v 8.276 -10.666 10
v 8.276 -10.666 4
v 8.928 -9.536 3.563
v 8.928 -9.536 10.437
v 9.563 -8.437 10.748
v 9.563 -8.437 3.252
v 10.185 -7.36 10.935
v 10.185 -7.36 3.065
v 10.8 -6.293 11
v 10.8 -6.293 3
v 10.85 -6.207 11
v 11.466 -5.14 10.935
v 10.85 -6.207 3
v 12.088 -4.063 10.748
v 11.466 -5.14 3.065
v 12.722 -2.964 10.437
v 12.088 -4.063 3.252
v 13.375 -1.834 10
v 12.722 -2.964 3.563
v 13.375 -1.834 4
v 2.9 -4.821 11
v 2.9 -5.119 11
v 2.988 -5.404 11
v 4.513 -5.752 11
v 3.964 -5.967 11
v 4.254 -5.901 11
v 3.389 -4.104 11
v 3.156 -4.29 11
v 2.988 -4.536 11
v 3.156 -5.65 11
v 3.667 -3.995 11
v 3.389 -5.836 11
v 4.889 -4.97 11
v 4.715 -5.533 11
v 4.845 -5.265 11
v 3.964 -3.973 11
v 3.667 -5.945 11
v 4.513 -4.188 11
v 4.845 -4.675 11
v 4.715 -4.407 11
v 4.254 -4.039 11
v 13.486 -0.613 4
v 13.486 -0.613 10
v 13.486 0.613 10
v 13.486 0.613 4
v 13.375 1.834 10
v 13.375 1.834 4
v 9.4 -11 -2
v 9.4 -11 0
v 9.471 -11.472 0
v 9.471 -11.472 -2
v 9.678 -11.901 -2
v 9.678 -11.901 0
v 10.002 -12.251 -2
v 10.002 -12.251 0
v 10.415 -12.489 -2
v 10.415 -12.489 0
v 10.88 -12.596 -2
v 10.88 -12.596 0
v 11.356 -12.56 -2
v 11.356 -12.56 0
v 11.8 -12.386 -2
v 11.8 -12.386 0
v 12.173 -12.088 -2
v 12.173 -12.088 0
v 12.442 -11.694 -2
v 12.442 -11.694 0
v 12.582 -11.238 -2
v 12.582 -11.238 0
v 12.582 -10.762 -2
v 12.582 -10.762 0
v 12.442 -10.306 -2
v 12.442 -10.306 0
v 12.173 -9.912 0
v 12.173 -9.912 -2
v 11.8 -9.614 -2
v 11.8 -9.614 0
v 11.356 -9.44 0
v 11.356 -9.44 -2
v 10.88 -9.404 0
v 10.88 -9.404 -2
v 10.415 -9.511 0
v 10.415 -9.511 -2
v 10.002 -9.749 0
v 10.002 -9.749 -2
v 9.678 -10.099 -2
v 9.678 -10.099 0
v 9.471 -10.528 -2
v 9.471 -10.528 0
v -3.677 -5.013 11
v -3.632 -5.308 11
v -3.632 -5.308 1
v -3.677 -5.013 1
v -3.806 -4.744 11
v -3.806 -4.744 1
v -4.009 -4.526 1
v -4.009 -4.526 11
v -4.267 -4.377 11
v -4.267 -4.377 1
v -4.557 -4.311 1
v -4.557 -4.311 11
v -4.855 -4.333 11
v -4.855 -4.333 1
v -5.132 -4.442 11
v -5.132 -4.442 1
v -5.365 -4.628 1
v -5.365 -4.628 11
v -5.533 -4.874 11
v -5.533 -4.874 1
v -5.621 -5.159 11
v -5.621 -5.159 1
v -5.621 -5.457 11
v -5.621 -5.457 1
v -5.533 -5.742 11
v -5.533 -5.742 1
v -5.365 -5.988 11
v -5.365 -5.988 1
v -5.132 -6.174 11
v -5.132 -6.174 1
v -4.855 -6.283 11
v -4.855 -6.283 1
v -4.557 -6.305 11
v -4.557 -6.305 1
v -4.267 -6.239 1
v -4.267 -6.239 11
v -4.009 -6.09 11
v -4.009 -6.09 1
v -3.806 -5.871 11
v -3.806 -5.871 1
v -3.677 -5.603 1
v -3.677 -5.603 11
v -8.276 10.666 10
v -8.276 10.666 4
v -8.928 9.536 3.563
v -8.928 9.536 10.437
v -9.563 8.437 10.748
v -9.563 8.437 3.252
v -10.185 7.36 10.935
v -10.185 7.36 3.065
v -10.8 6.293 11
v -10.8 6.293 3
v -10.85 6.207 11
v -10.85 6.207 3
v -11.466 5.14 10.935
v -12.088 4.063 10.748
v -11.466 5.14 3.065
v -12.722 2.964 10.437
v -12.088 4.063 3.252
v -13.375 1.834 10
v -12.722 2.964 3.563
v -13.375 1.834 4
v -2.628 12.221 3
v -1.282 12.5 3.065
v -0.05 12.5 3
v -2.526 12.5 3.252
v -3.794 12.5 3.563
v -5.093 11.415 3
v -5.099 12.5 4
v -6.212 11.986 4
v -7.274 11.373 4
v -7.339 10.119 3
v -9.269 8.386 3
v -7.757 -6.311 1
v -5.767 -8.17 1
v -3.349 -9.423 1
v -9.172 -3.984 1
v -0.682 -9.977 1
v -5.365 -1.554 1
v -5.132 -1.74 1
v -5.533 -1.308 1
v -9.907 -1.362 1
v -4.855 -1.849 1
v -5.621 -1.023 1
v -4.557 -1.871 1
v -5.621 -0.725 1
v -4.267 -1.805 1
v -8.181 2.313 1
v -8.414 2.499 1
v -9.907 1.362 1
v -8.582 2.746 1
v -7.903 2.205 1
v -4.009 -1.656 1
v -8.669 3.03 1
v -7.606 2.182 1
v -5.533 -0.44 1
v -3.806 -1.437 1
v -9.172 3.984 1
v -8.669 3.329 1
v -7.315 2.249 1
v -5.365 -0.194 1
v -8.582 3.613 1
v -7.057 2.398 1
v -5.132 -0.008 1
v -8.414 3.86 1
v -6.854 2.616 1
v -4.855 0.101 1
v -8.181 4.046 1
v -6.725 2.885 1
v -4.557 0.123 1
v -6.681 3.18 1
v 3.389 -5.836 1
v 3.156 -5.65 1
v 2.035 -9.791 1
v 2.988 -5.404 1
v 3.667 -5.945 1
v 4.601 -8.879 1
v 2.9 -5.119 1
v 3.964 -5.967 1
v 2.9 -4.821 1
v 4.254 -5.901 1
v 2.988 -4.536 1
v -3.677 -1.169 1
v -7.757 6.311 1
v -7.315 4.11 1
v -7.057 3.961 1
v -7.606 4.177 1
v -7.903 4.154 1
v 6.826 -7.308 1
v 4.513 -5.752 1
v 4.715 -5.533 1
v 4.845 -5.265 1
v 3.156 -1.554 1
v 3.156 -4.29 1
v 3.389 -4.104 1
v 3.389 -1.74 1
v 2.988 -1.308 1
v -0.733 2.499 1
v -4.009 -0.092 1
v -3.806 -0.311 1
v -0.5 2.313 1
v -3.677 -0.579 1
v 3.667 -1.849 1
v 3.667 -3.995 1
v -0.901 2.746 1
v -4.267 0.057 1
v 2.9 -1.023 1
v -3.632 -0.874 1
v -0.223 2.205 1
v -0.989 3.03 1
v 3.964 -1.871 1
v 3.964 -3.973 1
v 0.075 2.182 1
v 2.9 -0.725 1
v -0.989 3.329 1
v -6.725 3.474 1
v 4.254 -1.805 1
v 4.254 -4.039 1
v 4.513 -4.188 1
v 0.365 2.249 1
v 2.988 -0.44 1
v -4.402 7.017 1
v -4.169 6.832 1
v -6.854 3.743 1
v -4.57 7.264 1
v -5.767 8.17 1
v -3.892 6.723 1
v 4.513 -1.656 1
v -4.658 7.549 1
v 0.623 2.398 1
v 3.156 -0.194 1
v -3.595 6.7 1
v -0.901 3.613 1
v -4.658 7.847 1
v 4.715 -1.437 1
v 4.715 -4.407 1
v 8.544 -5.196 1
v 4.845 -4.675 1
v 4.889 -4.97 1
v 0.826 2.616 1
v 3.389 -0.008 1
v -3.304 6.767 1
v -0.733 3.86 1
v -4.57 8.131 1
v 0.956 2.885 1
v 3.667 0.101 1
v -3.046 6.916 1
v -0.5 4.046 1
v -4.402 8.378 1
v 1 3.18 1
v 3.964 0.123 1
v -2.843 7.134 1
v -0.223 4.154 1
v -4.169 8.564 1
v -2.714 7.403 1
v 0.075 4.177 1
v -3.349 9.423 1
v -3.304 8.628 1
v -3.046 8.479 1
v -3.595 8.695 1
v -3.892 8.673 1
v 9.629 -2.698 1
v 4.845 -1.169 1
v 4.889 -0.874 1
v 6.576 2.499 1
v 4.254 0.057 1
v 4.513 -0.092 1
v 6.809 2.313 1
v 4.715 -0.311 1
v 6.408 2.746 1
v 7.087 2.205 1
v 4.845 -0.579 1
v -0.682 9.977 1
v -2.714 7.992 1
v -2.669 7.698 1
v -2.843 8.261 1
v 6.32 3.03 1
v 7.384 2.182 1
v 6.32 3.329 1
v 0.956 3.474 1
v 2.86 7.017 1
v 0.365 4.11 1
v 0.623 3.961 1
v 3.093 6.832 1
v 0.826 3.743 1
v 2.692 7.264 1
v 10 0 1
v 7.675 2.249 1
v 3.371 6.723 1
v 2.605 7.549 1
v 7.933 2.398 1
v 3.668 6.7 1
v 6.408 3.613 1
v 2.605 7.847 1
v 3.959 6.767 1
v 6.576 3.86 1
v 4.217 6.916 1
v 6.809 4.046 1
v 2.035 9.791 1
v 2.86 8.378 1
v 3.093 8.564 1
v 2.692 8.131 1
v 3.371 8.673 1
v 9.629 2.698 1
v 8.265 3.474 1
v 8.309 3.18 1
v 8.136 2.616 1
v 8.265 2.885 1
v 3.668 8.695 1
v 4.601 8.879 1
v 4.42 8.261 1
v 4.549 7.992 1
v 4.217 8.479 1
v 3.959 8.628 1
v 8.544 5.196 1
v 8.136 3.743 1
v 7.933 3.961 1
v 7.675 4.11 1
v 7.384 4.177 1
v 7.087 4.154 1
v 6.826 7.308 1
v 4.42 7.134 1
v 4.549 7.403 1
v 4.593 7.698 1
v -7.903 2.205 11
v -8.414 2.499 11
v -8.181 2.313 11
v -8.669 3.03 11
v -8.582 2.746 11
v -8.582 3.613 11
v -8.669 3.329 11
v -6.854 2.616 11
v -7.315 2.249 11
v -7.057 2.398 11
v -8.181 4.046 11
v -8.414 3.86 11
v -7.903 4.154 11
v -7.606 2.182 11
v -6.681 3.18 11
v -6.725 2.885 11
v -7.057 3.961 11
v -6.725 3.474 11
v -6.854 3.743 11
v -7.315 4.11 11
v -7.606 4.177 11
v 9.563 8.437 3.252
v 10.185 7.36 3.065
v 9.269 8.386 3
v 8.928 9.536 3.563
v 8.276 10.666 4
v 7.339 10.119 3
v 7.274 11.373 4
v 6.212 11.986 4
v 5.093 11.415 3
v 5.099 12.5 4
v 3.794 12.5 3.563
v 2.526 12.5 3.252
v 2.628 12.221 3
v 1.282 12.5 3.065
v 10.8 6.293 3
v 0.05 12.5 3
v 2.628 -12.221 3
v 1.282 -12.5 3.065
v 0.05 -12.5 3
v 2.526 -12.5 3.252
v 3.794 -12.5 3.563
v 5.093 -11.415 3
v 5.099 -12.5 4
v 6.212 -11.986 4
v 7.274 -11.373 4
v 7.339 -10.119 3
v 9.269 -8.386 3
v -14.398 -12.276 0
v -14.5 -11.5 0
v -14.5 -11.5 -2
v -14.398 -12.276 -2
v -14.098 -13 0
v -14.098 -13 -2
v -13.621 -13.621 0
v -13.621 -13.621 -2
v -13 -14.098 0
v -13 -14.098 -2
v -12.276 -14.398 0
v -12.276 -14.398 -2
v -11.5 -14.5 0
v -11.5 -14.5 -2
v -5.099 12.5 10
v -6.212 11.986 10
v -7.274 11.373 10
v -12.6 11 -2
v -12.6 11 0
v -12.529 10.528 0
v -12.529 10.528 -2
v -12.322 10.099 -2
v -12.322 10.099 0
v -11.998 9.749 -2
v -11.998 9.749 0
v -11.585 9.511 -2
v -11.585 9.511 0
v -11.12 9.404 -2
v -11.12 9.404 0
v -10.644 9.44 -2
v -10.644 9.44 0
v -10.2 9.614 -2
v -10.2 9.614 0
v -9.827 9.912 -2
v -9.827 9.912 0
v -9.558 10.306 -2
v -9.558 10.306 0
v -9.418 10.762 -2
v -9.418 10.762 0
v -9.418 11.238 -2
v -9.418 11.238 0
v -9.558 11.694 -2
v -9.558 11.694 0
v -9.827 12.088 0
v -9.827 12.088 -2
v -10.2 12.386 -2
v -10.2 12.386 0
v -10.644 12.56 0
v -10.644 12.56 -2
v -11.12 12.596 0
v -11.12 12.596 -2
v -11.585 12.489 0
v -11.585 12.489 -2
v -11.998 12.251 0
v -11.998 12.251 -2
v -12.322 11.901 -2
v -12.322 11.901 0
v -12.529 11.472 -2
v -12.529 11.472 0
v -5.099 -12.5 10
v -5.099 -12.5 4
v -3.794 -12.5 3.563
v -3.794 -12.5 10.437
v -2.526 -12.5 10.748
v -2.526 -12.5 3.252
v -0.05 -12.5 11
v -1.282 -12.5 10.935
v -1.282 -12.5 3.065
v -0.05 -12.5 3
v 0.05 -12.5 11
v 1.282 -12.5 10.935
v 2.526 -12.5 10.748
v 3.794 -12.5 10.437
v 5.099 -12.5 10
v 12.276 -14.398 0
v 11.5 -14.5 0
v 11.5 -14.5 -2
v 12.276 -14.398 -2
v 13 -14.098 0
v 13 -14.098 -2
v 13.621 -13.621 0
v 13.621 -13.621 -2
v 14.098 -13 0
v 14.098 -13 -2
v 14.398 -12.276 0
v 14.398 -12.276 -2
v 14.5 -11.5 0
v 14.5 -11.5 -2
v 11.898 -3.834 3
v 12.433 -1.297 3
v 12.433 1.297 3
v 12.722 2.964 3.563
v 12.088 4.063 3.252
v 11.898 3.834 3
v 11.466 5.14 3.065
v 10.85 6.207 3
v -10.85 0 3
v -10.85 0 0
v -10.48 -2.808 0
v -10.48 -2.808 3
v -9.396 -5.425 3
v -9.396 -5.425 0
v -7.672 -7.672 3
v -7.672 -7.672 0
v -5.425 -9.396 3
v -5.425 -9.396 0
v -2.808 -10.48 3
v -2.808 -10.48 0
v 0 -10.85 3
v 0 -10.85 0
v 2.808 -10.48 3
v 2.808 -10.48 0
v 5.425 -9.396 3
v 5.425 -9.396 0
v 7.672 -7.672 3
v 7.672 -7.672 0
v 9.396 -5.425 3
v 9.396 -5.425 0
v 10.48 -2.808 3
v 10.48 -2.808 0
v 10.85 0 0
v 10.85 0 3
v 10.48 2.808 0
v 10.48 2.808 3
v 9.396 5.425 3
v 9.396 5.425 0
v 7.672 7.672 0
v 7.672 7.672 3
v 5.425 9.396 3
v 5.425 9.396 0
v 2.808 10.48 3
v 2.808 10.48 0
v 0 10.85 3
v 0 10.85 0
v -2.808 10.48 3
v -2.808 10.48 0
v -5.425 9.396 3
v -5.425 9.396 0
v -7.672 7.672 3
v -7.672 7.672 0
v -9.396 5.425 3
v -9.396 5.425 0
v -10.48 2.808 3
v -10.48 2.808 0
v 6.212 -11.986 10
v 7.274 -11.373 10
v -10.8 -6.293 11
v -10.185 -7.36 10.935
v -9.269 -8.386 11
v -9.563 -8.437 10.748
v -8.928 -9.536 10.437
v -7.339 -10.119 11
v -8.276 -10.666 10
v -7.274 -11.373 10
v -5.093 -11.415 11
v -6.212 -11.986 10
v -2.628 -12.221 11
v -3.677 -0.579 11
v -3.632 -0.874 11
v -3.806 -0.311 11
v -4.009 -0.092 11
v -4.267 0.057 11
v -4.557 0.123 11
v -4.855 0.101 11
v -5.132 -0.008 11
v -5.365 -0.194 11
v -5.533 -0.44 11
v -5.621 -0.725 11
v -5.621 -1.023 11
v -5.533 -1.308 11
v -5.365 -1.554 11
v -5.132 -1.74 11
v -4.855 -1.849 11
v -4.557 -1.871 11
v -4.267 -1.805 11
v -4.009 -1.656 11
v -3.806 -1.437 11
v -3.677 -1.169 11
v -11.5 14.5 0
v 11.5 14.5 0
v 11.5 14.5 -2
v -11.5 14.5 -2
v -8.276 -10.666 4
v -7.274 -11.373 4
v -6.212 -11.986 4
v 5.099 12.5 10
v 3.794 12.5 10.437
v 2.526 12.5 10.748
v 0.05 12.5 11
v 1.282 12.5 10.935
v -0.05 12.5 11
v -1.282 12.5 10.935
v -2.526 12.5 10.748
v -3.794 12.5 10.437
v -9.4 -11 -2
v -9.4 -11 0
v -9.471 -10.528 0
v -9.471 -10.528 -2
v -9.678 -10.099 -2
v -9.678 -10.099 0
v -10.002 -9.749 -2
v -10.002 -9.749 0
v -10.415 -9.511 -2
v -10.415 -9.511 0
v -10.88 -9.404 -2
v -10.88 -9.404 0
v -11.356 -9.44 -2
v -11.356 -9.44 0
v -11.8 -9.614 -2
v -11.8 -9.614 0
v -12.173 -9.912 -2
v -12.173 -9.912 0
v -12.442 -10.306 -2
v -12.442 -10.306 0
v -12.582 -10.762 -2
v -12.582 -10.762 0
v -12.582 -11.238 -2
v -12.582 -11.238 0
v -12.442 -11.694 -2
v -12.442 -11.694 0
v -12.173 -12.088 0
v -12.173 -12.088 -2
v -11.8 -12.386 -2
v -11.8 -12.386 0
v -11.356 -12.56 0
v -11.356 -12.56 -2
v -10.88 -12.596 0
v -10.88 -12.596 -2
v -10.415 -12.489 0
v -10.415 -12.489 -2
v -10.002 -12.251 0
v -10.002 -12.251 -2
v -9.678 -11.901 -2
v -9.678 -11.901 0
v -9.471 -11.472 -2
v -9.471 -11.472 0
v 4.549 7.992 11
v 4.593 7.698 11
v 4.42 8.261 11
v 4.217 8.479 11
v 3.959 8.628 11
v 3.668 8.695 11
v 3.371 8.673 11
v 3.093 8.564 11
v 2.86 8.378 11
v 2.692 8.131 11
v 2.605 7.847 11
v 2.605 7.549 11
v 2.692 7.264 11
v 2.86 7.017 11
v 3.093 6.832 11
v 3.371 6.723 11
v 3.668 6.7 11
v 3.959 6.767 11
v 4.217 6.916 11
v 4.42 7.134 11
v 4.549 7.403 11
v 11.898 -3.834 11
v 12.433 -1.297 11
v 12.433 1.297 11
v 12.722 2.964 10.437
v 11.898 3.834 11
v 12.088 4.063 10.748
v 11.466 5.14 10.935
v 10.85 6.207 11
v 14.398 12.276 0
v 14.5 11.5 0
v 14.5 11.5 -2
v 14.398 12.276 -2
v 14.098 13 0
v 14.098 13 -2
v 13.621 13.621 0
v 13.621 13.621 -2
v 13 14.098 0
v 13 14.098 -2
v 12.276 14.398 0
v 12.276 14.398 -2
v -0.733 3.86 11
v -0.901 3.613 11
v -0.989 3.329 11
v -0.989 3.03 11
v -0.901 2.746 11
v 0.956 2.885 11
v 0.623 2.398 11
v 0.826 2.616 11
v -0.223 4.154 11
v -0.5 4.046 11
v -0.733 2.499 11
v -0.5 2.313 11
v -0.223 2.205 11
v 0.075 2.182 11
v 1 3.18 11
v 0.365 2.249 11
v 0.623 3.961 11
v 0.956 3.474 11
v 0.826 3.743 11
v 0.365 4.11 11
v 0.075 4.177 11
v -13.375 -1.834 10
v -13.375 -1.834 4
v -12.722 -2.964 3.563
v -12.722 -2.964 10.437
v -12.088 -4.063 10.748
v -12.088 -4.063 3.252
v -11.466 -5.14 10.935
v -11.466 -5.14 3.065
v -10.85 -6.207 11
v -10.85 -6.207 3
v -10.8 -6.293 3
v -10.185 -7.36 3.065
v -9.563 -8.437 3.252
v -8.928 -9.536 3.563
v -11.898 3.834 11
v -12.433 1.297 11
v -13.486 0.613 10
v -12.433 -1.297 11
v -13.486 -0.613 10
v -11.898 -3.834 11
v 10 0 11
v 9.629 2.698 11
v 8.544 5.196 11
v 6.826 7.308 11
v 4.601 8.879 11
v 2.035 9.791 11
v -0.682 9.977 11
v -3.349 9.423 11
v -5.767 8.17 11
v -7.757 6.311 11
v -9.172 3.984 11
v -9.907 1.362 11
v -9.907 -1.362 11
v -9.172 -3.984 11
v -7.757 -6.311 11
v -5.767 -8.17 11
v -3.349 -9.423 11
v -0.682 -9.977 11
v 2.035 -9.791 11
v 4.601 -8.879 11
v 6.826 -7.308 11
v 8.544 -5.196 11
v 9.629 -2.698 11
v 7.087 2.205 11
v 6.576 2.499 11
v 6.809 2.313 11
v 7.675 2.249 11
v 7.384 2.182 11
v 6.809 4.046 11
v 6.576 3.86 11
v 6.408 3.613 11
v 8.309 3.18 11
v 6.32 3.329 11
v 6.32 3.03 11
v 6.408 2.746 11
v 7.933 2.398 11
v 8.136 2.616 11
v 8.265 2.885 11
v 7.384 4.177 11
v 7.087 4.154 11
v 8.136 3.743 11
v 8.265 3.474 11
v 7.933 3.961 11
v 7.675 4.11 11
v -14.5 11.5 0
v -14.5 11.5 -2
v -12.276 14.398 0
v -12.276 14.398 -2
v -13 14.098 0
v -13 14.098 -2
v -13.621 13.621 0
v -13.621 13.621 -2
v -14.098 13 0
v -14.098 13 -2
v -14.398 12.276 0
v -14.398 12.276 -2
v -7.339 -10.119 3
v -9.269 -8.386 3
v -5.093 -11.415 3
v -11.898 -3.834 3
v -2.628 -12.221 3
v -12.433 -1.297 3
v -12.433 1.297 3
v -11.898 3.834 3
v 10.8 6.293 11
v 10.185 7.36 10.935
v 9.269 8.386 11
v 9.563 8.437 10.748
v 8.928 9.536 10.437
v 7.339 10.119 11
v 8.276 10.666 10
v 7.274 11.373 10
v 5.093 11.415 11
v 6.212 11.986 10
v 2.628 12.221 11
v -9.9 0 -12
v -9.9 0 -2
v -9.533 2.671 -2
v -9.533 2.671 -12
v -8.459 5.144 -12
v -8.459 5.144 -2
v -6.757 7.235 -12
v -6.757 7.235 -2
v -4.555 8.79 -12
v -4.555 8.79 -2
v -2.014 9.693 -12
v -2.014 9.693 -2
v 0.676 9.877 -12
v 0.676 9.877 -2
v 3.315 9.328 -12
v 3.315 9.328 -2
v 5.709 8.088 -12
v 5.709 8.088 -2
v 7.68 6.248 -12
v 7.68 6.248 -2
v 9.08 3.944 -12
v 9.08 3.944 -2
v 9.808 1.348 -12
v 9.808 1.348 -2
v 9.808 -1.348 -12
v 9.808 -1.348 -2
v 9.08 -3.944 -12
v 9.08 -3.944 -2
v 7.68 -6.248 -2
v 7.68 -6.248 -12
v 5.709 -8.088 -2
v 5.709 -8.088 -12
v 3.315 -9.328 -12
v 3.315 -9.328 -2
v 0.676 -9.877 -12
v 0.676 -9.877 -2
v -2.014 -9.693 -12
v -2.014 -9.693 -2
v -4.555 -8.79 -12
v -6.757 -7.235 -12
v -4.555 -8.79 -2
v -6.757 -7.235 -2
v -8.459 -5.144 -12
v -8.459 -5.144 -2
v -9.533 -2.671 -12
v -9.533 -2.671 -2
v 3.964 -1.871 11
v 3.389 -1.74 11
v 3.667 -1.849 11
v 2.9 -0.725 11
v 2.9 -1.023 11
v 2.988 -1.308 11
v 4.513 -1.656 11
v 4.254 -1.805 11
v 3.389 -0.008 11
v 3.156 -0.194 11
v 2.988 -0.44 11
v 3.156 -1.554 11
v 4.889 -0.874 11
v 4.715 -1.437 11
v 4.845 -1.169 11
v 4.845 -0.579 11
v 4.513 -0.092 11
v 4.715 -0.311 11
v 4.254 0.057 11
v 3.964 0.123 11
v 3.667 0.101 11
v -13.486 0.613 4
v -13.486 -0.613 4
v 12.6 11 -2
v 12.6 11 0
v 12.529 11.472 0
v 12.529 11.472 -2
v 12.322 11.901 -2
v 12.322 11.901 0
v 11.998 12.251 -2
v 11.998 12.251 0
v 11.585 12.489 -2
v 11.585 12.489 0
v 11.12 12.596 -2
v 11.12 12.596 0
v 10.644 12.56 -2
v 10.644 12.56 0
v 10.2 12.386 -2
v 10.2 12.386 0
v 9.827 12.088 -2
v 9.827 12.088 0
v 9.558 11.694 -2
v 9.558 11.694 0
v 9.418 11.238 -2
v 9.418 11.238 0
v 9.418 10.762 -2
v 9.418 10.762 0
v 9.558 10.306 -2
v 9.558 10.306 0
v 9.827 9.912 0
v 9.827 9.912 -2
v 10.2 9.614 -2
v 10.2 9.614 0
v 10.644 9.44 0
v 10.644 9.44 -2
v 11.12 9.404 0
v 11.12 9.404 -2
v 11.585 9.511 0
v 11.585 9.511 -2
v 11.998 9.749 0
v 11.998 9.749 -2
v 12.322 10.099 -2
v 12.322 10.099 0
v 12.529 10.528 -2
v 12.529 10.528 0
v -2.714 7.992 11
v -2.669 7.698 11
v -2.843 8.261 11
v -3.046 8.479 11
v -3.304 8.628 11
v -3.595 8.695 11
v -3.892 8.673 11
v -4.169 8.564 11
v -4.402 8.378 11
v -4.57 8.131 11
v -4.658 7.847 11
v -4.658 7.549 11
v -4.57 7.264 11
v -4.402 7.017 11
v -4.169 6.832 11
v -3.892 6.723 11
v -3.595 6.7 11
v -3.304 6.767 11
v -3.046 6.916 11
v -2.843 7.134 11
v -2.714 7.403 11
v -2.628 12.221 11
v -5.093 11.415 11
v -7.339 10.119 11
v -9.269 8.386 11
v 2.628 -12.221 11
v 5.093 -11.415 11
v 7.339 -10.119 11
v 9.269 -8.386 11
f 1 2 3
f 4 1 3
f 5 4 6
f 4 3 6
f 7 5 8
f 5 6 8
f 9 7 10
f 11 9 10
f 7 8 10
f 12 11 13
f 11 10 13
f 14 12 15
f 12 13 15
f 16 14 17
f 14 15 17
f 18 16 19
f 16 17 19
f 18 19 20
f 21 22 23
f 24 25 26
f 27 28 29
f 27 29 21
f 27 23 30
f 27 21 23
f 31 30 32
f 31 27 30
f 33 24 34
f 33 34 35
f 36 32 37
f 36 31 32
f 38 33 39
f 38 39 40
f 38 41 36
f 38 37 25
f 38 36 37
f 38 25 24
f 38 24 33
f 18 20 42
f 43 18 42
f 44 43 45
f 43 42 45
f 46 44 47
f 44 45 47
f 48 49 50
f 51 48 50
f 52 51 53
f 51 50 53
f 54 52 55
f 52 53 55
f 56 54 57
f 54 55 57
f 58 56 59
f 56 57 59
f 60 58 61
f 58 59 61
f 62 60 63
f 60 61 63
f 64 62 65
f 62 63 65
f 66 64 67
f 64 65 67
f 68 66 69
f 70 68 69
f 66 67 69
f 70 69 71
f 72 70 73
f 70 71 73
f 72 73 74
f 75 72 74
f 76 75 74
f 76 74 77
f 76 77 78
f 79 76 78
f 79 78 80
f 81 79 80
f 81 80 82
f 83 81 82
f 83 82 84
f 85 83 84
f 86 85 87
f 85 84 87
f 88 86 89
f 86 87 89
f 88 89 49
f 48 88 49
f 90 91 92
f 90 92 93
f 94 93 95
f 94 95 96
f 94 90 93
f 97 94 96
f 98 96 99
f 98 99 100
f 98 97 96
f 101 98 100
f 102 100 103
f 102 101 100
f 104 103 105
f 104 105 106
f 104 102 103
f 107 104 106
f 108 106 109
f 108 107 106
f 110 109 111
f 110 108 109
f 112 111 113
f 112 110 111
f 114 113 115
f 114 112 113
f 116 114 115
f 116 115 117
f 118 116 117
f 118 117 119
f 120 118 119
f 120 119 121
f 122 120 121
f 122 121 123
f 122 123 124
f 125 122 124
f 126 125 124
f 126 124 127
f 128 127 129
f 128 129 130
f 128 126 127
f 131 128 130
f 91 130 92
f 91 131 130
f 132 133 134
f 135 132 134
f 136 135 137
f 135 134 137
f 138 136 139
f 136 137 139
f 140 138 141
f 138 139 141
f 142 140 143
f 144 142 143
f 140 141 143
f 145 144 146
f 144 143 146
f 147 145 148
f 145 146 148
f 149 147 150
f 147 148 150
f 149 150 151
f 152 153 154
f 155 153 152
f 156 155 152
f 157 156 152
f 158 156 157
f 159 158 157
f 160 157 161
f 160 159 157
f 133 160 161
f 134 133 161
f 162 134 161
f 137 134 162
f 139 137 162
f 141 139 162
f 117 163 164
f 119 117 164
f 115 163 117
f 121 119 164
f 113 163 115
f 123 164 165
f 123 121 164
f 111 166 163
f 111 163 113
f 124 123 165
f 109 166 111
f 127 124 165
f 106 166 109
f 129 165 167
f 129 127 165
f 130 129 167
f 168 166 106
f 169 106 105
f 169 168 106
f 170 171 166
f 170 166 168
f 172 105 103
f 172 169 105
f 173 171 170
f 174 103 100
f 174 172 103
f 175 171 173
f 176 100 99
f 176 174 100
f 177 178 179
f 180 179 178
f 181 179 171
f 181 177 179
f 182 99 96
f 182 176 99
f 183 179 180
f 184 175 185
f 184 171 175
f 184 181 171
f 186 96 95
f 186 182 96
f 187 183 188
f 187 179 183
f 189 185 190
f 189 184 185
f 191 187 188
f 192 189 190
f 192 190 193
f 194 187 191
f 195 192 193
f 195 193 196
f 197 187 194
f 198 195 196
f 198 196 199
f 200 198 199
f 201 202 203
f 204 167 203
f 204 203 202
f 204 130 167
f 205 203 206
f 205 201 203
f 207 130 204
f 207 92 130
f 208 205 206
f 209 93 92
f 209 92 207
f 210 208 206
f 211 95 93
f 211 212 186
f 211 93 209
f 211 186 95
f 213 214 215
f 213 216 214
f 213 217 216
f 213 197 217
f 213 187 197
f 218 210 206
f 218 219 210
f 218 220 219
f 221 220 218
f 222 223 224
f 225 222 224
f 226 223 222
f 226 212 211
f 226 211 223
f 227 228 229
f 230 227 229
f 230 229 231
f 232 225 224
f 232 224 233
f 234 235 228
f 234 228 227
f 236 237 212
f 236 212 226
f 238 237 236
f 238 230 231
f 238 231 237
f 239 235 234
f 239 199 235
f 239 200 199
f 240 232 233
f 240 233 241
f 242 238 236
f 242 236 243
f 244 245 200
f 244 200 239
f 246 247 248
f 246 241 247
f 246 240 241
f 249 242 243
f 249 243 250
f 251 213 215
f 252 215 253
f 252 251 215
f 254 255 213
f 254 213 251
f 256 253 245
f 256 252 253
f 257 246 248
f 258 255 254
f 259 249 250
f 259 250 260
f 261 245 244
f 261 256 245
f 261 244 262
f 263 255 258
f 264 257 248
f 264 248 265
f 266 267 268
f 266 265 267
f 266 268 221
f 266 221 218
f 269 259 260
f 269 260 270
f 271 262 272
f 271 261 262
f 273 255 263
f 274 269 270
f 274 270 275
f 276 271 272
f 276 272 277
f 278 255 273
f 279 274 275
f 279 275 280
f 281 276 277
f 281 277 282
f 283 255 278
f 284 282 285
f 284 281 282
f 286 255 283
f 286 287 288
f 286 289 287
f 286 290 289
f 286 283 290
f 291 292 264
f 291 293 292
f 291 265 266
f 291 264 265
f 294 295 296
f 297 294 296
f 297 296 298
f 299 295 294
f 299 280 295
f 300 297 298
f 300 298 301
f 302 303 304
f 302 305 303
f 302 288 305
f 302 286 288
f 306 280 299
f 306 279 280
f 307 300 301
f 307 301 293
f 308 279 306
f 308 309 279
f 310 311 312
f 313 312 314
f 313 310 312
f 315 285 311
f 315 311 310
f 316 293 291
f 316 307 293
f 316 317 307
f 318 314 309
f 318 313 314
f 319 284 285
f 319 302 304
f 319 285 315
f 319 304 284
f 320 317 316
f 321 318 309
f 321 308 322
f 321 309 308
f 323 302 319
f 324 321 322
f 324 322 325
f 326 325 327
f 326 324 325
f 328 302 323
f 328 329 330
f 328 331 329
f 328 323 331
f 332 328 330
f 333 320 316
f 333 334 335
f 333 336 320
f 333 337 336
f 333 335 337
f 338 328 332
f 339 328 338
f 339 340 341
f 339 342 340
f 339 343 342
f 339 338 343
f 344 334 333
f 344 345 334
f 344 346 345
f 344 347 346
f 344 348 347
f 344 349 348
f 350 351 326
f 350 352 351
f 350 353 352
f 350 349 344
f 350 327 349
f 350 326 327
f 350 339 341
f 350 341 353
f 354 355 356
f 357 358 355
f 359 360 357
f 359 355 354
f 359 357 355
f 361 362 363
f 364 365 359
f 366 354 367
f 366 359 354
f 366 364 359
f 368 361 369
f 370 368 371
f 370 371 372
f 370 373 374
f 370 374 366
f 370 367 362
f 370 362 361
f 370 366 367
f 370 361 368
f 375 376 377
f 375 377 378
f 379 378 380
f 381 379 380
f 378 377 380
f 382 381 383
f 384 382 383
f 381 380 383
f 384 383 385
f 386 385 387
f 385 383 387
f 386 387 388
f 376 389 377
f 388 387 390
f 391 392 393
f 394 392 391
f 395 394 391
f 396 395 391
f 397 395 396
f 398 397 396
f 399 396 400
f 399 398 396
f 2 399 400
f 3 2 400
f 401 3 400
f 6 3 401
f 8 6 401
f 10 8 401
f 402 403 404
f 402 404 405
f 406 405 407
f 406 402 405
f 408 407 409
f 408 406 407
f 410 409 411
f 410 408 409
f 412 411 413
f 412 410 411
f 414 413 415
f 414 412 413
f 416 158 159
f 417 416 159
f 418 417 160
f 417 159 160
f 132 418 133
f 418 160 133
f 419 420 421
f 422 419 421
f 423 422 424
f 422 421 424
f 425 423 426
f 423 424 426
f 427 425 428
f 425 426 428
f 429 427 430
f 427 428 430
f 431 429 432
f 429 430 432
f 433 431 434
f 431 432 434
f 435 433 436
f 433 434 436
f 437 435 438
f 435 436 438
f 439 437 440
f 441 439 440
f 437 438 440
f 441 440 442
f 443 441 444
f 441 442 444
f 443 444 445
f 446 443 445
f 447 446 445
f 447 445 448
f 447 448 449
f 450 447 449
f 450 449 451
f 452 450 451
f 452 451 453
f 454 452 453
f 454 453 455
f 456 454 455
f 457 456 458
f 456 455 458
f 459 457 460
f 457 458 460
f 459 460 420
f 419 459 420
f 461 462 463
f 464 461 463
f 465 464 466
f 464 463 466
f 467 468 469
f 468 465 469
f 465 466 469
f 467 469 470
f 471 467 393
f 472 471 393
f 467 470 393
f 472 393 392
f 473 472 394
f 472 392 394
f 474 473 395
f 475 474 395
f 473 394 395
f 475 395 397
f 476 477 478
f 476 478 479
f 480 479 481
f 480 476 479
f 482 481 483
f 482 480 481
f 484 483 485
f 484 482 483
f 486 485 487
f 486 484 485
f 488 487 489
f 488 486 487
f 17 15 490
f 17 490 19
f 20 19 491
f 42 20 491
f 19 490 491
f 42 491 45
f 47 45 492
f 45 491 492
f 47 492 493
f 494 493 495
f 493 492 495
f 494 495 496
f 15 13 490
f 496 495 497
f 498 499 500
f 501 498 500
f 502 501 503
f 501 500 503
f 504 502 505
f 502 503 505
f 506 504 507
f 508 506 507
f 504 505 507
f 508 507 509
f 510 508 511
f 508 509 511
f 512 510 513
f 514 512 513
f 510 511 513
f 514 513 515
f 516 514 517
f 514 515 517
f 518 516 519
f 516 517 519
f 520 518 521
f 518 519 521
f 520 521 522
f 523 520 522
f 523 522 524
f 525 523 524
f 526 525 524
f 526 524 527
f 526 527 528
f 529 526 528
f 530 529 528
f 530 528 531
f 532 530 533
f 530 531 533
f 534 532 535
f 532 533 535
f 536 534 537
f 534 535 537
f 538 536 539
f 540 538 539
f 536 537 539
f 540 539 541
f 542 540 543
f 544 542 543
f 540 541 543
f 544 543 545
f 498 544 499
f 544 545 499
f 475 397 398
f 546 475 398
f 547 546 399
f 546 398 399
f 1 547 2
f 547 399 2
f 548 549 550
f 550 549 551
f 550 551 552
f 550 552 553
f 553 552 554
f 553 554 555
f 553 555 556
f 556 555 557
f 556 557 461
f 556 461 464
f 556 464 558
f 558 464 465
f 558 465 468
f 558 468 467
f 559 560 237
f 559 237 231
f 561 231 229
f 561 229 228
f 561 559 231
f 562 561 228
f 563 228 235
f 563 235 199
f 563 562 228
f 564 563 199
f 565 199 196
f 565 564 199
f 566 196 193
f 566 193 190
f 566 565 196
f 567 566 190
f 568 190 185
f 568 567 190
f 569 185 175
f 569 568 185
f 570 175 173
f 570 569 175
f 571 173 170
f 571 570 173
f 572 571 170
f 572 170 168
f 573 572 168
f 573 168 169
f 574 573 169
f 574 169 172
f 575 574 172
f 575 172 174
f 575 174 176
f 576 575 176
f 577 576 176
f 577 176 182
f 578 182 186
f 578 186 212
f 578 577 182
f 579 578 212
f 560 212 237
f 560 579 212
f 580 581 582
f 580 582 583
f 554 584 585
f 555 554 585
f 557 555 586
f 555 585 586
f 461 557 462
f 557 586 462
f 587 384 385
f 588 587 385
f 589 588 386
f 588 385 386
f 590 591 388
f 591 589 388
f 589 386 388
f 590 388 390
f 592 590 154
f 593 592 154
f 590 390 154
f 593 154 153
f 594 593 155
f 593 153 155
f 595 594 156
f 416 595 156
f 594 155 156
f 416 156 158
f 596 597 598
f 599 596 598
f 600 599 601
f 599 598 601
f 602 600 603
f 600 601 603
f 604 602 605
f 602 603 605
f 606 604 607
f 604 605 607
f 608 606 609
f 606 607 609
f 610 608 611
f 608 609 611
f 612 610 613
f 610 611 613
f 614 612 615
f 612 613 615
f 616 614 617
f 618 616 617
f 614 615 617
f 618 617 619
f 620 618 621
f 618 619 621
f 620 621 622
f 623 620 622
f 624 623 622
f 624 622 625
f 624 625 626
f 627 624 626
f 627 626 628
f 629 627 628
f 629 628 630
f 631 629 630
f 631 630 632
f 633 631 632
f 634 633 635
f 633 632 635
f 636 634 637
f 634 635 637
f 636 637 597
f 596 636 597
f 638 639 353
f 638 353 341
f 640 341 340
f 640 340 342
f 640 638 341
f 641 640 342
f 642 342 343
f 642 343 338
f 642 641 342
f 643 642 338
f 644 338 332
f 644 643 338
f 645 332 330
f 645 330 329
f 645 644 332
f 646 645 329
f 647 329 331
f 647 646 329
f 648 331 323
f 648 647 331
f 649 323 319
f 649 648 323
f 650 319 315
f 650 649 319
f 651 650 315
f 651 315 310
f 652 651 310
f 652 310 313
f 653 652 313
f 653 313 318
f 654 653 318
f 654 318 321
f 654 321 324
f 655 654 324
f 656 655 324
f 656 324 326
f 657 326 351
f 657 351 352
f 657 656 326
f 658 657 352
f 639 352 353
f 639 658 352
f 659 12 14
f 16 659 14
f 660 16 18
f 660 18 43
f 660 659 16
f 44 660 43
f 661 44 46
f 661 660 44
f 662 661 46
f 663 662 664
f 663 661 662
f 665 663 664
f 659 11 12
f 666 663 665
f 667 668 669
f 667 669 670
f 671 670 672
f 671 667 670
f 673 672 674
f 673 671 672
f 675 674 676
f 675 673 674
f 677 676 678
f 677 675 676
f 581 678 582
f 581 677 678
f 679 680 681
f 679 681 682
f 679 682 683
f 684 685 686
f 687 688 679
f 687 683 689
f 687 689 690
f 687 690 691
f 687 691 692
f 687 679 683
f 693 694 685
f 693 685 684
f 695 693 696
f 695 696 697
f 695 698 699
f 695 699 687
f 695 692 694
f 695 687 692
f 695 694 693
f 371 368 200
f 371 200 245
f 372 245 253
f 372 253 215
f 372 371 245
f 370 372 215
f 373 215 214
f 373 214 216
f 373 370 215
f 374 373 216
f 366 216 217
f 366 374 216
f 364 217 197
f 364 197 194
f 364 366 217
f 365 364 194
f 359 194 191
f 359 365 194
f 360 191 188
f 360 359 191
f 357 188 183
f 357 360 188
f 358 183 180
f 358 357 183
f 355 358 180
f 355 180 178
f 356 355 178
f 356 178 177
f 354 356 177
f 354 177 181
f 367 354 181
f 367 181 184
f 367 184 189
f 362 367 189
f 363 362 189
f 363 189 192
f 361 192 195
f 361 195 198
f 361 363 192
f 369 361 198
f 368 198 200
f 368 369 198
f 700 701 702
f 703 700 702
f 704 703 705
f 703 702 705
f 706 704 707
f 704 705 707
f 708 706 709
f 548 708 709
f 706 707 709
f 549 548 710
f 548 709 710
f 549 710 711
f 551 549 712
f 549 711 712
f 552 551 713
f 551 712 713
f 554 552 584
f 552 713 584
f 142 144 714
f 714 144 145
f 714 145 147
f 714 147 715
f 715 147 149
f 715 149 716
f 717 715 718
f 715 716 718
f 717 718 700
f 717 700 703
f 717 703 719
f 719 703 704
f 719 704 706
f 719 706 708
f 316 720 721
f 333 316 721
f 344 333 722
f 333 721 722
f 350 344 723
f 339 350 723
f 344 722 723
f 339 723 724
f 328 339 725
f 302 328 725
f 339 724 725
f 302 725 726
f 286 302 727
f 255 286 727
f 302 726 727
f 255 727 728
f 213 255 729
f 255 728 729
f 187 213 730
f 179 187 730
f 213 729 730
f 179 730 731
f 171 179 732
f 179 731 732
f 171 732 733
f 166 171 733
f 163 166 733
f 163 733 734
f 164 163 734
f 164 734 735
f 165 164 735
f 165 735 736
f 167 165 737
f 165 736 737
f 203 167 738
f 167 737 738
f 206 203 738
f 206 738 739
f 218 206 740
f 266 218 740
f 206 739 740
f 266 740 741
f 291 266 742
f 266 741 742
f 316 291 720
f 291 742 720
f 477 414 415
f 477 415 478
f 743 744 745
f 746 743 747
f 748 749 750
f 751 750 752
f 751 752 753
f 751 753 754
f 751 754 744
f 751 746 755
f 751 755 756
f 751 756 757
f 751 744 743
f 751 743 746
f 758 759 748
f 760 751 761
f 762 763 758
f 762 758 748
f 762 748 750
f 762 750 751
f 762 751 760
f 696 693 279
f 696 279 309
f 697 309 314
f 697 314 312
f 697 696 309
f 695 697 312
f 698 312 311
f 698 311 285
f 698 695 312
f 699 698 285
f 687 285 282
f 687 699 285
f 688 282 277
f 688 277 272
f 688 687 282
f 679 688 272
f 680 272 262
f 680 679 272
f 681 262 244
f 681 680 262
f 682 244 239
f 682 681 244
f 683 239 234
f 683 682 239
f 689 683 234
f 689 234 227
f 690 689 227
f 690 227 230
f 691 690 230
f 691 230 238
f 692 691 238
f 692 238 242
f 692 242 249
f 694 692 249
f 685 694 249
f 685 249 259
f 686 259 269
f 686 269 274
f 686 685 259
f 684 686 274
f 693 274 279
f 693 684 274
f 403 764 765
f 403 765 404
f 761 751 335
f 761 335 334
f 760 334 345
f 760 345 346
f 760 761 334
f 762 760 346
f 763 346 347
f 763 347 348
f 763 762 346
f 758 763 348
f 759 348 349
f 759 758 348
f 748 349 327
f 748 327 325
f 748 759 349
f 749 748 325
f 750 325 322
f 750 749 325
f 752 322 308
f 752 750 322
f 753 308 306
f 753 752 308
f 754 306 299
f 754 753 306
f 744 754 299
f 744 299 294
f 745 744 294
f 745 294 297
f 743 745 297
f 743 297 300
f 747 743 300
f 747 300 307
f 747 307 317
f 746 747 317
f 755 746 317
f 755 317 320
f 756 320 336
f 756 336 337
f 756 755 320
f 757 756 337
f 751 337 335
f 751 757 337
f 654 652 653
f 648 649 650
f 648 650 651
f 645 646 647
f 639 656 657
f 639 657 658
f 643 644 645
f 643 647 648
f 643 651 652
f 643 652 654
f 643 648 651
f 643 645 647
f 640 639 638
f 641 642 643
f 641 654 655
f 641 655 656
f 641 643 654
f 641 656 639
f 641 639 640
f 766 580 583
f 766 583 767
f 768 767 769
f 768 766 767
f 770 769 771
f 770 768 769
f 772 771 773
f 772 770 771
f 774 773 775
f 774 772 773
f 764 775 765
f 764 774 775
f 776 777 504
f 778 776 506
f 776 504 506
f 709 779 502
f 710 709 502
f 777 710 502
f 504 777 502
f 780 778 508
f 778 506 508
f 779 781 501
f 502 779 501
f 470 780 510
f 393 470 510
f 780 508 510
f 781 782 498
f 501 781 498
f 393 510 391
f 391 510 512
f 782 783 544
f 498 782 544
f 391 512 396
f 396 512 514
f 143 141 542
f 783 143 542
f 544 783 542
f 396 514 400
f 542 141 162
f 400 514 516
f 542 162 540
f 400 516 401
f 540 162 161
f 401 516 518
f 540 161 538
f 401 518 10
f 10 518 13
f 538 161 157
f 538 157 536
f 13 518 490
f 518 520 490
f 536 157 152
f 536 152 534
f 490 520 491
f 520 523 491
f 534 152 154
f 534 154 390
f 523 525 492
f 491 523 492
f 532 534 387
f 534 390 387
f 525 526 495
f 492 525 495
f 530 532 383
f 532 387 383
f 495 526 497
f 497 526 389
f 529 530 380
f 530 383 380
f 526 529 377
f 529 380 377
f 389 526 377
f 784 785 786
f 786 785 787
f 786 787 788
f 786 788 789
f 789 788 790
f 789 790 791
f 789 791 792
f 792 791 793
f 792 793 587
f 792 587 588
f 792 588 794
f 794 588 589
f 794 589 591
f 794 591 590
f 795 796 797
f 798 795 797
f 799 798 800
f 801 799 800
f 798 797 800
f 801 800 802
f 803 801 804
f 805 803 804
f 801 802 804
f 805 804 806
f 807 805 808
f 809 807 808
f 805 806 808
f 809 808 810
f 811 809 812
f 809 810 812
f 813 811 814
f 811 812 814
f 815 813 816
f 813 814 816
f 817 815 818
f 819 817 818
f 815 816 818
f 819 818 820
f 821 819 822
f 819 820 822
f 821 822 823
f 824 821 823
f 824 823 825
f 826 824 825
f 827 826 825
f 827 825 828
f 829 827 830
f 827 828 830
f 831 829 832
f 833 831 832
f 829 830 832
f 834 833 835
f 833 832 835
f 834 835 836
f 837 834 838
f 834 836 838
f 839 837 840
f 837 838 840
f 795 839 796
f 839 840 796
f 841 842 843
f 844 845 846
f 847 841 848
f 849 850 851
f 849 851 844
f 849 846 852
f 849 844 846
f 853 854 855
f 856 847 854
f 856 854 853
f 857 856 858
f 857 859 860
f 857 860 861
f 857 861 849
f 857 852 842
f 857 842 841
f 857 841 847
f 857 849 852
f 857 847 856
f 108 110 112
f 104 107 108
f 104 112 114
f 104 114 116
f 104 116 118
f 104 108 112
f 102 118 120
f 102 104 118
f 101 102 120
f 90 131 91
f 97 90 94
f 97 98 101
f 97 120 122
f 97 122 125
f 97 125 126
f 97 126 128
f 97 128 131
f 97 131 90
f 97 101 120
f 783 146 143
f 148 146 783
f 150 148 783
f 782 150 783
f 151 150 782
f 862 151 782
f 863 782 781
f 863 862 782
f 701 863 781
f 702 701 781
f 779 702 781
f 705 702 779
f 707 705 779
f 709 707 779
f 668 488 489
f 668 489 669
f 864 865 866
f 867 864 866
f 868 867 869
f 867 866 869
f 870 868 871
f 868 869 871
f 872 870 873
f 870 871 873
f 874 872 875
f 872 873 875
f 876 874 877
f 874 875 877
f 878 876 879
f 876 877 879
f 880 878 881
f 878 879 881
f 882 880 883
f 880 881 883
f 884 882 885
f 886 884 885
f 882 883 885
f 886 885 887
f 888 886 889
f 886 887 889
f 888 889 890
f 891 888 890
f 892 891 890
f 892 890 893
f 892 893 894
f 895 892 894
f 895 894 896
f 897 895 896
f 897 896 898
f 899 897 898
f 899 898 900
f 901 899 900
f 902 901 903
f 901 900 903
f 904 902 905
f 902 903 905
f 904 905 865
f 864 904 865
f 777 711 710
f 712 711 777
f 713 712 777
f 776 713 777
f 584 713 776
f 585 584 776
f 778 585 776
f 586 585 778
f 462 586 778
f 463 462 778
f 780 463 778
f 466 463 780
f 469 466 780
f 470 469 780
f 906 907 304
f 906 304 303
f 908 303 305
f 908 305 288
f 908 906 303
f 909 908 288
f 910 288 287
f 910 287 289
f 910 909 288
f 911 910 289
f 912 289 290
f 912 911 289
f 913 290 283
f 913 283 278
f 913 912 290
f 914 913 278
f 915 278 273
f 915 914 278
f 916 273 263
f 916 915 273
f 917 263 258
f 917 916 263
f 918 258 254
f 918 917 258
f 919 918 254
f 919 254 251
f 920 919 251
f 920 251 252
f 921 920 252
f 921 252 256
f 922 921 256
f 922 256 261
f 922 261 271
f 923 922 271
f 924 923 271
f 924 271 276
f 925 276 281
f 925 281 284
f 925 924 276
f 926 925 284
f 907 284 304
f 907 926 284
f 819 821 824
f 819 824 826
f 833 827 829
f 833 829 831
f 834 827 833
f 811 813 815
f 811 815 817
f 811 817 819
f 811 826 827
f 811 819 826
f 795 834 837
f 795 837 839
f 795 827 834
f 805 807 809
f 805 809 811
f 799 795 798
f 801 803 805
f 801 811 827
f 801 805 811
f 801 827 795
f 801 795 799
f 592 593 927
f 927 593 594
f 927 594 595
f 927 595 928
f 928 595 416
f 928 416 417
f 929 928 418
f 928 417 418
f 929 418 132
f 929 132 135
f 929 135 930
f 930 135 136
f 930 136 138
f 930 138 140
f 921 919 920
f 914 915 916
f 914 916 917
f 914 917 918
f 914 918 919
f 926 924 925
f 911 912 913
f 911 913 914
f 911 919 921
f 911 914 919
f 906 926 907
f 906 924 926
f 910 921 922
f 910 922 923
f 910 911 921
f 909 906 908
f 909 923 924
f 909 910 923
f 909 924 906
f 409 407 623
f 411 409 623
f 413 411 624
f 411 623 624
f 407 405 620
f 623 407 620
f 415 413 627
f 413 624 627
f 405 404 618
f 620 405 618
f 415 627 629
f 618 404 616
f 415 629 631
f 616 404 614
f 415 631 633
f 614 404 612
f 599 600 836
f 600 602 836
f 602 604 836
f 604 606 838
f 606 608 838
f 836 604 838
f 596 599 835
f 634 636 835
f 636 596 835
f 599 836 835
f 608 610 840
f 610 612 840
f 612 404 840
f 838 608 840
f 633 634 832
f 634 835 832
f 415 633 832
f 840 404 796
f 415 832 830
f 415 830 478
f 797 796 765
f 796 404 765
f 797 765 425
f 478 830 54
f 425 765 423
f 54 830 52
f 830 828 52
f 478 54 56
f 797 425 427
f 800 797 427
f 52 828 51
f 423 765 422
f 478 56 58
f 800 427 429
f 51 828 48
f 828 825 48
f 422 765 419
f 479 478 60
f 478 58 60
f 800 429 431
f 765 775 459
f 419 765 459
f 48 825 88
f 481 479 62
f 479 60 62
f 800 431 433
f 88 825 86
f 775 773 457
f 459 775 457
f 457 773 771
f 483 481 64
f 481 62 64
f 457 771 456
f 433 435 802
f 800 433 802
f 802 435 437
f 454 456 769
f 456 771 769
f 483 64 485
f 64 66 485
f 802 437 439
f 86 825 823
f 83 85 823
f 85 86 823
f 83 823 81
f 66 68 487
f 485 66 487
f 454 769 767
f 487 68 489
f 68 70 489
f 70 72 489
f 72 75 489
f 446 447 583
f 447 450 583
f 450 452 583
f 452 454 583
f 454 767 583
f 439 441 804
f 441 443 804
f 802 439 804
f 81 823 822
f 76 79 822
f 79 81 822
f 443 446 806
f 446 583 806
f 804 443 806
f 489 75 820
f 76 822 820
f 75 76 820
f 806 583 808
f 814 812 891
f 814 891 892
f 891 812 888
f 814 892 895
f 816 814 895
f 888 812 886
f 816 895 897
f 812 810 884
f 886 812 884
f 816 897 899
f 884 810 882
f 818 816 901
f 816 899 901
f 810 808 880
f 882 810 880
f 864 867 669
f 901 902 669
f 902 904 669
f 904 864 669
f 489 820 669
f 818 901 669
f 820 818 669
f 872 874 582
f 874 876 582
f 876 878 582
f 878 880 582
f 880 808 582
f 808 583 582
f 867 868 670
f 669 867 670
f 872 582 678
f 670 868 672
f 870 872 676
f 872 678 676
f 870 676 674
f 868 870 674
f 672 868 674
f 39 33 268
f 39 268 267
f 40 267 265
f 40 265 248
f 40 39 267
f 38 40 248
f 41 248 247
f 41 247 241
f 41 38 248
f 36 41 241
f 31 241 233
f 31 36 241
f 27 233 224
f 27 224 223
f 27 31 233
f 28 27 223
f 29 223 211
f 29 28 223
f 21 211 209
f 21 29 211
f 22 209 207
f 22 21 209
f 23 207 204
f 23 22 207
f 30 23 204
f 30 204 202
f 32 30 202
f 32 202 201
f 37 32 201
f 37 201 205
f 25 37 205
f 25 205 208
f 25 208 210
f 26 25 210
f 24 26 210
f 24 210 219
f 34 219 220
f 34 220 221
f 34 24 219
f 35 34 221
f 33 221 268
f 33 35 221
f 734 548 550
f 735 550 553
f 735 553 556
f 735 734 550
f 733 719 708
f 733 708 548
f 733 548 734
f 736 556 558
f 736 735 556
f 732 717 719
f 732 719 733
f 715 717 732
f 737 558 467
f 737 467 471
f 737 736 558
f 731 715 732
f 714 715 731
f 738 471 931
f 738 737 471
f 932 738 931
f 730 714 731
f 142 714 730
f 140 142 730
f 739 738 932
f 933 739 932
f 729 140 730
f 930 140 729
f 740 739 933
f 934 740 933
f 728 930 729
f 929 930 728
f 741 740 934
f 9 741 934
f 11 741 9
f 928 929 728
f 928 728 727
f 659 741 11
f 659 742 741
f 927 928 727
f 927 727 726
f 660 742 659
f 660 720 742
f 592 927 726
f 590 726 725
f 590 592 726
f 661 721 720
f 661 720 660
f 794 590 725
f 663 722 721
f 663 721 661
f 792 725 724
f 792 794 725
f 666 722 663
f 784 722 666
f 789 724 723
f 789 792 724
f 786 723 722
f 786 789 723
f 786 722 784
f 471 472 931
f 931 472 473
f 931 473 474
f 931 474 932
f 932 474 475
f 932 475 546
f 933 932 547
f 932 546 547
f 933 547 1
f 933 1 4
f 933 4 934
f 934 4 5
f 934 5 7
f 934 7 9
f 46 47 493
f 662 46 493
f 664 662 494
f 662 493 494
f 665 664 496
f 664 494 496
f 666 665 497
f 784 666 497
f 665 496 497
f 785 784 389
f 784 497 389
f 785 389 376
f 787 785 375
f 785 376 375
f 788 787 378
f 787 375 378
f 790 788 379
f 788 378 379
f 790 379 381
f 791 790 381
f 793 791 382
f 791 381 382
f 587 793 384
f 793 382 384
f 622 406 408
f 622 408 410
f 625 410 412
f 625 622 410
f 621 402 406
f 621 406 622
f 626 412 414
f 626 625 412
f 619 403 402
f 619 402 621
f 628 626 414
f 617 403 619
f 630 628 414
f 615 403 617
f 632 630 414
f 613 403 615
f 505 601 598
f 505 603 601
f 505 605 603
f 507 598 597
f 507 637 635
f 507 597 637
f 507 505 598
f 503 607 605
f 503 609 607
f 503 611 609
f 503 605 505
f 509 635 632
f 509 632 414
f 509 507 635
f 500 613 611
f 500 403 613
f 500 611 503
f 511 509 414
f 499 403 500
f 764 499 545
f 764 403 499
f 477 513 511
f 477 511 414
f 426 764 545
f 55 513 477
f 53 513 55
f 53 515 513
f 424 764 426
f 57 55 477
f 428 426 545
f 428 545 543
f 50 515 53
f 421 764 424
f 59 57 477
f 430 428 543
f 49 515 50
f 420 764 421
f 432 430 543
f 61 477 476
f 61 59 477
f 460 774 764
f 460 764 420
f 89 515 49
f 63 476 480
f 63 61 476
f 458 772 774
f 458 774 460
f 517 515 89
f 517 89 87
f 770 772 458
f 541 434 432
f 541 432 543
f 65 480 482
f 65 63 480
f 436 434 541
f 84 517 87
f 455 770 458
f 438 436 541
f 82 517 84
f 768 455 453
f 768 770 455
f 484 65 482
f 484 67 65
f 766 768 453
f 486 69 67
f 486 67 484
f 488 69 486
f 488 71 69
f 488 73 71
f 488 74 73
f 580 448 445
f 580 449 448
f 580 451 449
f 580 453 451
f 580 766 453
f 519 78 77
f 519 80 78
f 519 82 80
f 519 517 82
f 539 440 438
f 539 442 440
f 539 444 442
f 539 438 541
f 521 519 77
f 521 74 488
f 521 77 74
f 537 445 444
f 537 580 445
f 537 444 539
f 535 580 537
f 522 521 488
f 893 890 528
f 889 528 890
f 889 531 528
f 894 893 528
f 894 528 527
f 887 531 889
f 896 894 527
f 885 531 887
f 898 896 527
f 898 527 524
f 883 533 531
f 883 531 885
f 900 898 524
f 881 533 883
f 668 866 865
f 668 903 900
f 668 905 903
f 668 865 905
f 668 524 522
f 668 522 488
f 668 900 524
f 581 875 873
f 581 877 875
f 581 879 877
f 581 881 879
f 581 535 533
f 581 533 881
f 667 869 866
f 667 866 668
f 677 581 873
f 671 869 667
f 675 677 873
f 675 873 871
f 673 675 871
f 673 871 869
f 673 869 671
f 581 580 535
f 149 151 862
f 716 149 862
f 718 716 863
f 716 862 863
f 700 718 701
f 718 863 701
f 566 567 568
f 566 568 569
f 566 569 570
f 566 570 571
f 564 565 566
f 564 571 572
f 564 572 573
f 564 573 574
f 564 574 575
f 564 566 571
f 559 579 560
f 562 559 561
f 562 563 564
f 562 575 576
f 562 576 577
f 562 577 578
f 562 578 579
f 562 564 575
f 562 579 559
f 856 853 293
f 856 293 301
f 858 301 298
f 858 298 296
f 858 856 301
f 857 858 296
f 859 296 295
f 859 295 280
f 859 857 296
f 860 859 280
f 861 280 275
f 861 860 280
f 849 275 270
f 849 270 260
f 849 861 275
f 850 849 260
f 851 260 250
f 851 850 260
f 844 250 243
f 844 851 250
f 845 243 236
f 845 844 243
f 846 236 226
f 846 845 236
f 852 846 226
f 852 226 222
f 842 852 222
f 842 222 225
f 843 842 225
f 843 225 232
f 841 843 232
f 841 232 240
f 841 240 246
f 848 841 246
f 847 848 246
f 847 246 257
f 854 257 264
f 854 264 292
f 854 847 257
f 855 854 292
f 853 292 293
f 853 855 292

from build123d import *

# Parameters (mm, degrees)
SKETCH_1_R          = 1.6
EXTRUDE_1_DEPTH     = 2
SKETCH_2_R          = 10.85
EXTRUDE_2_DEPTH     = 3
EXTRUDE_3_DEPTH     = 8
SKETCH_4_R          = 9.9
EXTRUDE_4_DEPTH     = 10
CHAMFER_1_SIZE      = 1
CHAMFER_2_SIZE      = 1
SKETCH_5_R          = 10
SKETCH_5_R_2        = 1
CUT_EXTRUDE_1_DEPTH = 10


with BuildPart() as part:
    # 草图1 → 凸台-拉伸1 (new body)
    with BuildSketch(Plane.XY):
        with BuildLine():
            Line((-11.5, -14.5), (11.5, -14.5))
            ThreePointArc((11.5, -14.5), (13.621320344, -13.621320344), (14.5, -11.5))
            Line((14.5, -11.5), (14.5, 11.5))
            ThreePointArc((14.5, 11.5), (13.621320344, 13.621320344), (11.5, 14.5))
            Line((11.5, 14.5), (-11.5, 14.5))
            ThreePointArc((-11.5, 14.5), (-13.621320344, 13.621320344), (-14.5, 11.5))
            Line((-14.5, 11.5), (-14.5, -11.5))
            ThreePointArc((-14.5, -11.5), (-13.621320344, -13.621320344), (-11.5, -14.5))
        make_face()
        with Locations((11, 11)):
            Circle(SKETCH_1_R, mode=Mode.SUBTRACT)
        with Locations(Location((-11, 11, 0), (0, 0, 180))):
            Circle(SKETCH_1_R, mode=Mode.SUBTRACT)
        with Locations((-11, -11)):
            Circle(SKETCH_1_R, mode=Mode.SUBTRACT)
        with Locations(Location((11, -11, 0), (0, 0, 180))):
            Circle(SKETCH_1_R, mode=Mode.SUBTRACT)
    extrude(amount=-EXTRUDE_1_DEPTH)

    # 草图2 → 凸台-拉伸2 (add)
    with BuildSketch(Plane.XY):
        with Locations(Location((0, 0, 0), (0, 0, 180))):
            Circle(SKETCH_2_R)
    extrude(amount=EXTRUDE_2_DEPTH)

    # 草图3 → 凸台-拉伸3 (add)
    with BuildSketch(Plane.XY.offset(3)):
        with BuildLine():
            Line((13.374827304, 1.834119567), (8.275807791, 10.665880433))
            ThreePointArc((8.275807791, 10.665880433), (6.75, 11.691342951), (5.099019514, 12.5))
            Line((5.099019514, 12.5), (-5.099019514, 12.5))
            ThreePointArc((-5.099019514, 12.5), (-6.75, 11.691342951), (-8.275807791, 10.665880433))
            Line((-8.275807791, 10.665880433), (-13.374827304, 1.834119567))
            ThreePointArc((-13.374827304, 1.834119567), (-13.5, 0), (-13.374827304, -1.834119567))
            Line((-13.374827304, -1.834119567), (-8.275807791, -10.665880433))
            ThreePointArc((-8.275807791, -10.665880433), (-6.75, -11.691342951), (-5.099019514, -12.5))
            Line((-5.099019514, -12.5), (5.099019514, -12.5))
            ThreePointArc((5.099019514, -12.5), (6.75, -11.691342951), (8.275807791, -10.665880433))
            Line((8.275807791, -10.665880433), (13.374827304, -1.834119567))
            ThreePointArc((13.374827304, -1.834119567), (13.5, 0), (13.374827304, 1.834119567))
        make_face()
    extrude(amount=EXTRUDE_3_DEPTH)

    # 草图4 → 凸台-拉伸4 (add)
    with BuildSketch(Plane(origin=(0, 0, -2), x_dir=(-1, 0, 0), z_dir=(0, 0, -1))):
        Circle(SKETCH_4_R)
    extrude(amount=EXTRUDE_4_DEPTH)

    # 倒角1
    chamfer_1_edges = [part.edges().sort_by_distance(p)[0] for p in [
        (-6.75, -11.691342951, 3),
        (-13.5, 0, 3),
        (-6.75, 11.691342951, 3),
        (6.75, 11.691342951, 3),
        (6.75, -11.691342951, 3),
        (13.5, 0, 3),
    ]]
    chamfer(chamfer_1_edges, length=CHAMFER_1_SIZE - 0.0001)  # a hair under: the kernel refuses the full size

    # 倒角2
    chamfer_2_edges = [part.edges().sort_by_distance(p)[0] for p in [
        (13.5, 0, 11),
        (6.75, 11.691342951, 11),
        (6.75, -11.691342951, 11),
        (-6.75, -11.691342951, 11),
        (-6.75, 11.691342951, 11),
        (-13.5, 0, 11),
    ]]
    chamfer(chamfer_2_edges, length=CHAMFER_2_SIZE - 0.0001)  # a hair under: the kernel refuses the full size

    # 草图5 → 切除-拉伸1 (cut)
    with BuildSketch(Plane.XY.offset(11)):
        Circle(SKETCH_5_R)
        with Locations((-3.66926495, 7.697601599)):
            Circle(SKETCH_5_R_2, mode=Mode.SUBTRACT)
        with Locations((3.593463585, 7.697601599)):
            Circle(SKETCH_5_R_2, mode=Mode.SUBTRACT)
        with Locations((-7.680655711, 3.179508847)):
            Circle(SKETCH_5_R_2, mode=Mode.SUBTRACT)
        with Locations((0, 3.179508847)):
            Circle(SKETCH_5_R_2, mode=Mode.SUBTRACT)
        with Locations((7.309278185, 3.179508847)):
            Circle(SKETCH_5_R_2, mode=Mode.SUBTRACT)
        with Locations((-4.63214688, -0.87410708)):
            Circle(SKETCH_5_R_2, mode=Mode.SUBTRACT)
        with Locations((3.889039747, -0.87410708)):
            Circle(SKETCH_5_R_2, mode=Mode.SUBTRACT)
        with Locations((-4.63214688, -5.3077495)):
            Circle(SKETCH_5_R_2, mode=Mode.SUBTRACT)
        with Locations((3.889039747, -4.969948172)):
            Circle(SKETCH_5_R_2, mode=Mode.SUBTRACT)
    extrude(amount=-CUT_EXTRUDE_1_DEPTH, mode=Mode.SUBTRACT)


solid = part.part
